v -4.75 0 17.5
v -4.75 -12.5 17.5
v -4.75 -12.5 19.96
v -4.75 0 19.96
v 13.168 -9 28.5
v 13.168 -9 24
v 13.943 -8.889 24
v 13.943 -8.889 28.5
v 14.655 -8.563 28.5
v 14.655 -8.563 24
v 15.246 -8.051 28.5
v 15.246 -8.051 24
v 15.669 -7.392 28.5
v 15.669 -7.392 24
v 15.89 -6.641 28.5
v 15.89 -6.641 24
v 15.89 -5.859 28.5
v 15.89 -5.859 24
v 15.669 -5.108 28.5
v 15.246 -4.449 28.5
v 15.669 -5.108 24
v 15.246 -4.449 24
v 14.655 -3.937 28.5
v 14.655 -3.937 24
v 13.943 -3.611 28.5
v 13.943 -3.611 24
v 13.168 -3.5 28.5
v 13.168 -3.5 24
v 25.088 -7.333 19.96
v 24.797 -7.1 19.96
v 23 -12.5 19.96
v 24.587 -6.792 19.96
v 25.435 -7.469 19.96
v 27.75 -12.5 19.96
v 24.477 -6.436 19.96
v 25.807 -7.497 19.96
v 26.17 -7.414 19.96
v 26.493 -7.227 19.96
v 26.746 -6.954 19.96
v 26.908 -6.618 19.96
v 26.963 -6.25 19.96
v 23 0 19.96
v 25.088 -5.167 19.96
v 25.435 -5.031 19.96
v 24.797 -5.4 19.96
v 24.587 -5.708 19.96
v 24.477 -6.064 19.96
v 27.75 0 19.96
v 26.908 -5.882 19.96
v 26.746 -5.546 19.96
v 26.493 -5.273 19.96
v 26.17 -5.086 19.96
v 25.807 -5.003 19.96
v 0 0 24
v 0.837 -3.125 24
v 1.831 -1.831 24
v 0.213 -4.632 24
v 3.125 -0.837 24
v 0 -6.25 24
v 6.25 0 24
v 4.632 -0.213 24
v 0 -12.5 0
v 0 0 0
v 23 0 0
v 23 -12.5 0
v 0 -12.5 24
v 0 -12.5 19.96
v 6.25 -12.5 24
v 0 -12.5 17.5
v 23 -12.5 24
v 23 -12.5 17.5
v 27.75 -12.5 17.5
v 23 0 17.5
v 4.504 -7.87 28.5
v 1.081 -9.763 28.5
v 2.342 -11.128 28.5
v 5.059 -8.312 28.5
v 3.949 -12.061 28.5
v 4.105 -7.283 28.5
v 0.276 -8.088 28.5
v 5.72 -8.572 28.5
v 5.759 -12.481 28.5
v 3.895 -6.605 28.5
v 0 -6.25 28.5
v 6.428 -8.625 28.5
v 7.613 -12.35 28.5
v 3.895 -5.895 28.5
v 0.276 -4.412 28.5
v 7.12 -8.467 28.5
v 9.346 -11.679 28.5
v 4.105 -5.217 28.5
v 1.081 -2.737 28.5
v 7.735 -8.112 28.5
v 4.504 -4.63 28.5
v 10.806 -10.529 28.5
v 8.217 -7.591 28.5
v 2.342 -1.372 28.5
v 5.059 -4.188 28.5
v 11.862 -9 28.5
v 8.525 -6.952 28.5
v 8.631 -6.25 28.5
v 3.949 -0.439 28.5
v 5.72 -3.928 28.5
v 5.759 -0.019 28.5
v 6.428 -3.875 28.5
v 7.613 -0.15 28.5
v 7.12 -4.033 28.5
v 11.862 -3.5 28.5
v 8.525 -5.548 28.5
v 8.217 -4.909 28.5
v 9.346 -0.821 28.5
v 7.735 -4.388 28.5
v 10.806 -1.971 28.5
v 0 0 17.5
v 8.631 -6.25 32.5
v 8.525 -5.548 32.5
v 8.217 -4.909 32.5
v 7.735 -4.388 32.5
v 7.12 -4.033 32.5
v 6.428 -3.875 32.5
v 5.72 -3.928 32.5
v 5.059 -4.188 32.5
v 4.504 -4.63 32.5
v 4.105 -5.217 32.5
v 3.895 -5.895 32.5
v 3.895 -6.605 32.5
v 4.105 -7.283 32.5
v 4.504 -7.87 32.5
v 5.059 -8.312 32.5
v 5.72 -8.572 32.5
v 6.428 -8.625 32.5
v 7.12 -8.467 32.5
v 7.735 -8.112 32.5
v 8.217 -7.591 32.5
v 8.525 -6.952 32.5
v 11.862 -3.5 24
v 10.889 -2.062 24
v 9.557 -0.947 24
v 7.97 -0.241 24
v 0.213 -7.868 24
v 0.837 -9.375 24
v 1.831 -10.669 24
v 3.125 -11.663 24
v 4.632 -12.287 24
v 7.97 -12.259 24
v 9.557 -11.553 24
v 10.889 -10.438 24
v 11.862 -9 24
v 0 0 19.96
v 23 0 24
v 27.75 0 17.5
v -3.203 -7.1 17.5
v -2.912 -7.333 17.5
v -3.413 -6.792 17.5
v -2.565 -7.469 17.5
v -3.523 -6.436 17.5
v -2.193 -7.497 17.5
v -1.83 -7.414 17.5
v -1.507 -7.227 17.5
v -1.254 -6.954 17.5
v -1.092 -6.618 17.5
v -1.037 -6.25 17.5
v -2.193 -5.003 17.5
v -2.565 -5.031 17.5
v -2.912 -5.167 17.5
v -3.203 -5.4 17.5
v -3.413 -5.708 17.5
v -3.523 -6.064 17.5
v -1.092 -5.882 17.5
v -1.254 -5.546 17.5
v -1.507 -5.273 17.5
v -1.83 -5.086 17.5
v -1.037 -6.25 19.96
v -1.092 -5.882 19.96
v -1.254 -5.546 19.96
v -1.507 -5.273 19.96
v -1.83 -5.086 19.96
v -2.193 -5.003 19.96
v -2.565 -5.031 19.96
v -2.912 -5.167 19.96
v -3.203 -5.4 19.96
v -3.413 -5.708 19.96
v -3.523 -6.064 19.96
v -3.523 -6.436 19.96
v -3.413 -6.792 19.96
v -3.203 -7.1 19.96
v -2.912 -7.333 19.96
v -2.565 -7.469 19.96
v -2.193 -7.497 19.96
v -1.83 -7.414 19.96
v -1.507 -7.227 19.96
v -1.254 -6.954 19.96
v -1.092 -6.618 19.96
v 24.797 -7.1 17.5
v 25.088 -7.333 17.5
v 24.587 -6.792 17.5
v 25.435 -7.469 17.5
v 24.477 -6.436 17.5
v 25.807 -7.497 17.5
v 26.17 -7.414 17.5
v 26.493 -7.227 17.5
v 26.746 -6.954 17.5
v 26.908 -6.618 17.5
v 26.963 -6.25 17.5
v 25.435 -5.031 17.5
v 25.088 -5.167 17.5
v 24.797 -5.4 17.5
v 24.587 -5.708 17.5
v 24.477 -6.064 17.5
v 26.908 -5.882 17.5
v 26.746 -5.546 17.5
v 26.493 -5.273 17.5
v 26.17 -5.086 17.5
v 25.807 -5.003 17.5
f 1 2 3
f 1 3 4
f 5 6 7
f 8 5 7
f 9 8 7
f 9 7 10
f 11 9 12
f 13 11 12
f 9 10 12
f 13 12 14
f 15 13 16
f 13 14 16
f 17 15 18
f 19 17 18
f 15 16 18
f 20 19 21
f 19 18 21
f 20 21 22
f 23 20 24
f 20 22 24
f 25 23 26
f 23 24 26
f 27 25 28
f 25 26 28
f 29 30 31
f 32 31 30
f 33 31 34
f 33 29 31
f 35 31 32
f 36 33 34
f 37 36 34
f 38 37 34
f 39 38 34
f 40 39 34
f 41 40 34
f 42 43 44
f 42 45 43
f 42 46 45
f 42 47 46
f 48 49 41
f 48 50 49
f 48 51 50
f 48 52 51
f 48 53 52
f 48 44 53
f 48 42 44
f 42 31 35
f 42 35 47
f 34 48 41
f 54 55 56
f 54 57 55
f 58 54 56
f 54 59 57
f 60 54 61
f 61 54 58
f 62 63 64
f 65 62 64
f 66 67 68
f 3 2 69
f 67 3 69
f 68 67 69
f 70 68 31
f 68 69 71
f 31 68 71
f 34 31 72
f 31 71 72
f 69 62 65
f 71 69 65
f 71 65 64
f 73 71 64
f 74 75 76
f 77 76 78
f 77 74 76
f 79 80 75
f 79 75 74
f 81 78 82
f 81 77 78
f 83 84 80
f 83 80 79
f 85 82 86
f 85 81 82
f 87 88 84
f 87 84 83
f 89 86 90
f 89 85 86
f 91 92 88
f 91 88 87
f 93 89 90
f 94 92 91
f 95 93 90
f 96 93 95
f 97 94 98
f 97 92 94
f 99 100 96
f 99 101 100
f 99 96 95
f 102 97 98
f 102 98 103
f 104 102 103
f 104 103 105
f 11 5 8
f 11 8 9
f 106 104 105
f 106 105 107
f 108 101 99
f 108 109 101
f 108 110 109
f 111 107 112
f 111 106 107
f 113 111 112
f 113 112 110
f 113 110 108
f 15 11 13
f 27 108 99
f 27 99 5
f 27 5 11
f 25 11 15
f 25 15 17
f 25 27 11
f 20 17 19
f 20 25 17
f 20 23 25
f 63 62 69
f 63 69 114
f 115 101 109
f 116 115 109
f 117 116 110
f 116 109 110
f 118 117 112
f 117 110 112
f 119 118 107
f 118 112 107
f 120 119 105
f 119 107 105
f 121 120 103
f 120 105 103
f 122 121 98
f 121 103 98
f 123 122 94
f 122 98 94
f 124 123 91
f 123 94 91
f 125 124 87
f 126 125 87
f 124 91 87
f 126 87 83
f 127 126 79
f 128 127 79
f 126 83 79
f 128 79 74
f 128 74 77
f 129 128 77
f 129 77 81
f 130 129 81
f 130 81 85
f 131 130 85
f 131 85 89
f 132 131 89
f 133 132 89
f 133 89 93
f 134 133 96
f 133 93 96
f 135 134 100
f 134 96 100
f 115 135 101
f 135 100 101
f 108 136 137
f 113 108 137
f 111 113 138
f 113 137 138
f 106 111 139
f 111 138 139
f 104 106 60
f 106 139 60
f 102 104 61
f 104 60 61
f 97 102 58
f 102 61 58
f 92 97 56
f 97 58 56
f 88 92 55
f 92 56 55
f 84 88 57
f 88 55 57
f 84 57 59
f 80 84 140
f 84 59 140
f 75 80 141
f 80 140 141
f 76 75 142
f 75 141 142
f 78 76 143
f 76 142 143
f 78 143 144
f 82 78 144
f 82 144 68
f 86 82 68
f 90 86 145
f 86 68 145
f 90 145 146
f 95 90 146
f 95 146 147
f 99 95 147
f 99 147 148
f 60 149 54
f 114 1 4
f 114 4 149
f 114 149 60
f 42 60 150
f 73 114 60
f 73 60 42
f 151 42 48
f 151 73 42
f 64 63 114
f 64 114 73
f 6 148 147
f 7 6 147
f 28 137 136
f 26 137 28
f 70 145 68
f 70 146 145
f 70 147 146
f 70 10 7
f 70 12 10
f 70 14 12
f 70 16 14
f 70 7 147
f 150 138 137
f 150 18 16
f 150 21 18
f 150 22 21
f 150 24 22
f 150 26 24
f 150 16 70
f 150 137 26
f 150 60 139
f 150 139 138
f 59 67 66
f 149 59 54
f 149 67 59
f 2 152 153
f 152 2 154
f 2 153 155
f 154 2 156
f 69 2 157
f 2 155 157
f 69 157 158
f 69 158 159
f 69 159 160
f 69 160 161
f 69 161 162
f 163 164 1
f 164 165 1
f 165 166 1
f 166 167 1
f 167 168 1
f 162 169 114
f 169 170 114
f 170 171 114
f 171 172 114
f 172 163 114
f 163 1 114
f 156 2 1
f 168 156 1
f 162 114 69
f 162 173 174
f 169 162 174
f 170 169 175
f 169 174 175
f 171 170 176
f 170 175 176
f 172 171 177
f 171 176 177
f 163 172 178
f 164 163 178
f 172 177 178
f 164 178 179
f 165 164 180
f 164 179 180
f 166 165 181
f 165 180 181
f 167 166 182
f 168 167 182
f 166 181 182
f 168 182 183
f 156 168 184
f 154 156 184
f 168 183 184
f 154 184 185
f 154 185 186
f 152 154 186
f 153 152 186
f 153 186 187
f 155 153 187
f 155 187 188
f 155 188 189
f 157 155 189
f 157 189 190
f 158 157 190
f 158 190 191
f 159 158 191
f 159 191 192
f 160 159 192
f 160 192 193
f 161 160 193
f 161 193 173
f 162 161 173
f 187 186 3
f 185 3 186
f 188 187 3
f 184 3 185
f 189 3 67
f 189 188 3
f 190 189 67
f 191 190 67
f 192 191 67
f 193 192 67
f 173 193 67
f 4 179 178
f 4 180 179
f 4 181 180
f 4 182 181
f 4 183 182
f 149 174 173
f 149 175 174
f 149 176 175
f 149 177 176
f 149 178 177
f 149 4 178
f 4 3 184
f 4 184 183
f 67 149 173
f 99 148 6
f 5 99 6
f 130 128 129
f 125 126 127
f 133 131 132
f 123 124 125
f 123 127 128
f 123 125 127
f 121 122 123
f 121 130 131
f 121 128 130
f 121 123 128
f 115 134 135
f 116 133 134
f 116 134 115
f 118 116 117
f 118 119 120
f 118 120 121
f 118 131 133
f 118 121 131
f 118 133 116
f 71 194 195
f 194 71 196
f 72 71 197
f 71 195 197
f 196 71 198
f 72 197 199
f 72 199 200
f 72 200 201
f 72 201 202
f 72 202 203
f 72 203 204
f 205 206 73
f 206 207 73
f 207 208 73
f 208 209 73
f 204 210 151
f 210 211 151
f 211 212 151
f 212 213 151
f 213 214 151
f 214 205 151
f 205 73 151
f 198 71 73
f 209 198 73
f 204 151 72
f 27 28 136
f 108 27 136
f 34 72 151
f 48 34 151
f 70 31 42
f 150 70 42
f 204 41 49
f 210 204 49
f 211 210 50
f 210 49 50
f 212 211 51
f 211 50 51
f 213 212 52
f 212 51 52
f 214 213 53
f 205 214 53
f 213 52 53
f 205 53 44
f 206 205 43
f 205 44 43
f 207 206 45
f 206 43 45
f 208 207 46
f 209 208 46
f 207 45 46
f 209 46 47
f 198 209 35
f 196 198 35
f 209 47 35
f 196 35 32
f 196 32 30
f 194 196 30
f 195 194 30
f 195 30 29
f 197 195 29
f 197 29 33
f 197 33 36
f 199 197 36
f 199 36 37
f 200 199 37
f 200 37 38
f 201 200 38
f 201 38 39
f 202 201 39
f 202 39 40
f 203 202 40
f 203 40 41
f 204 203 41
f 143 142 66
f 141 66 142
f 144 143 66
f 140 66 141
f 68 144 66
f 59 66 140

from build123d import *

# Parameters (mm, degrees)
SKETCH_1_W          = 23
SKETCH_1_H          = 12.5
EXTRUDE_1_DEPTH     = 24
SKETCH_2_W          = 32.5
SKETCH_2_H          = 12.5
EXTRUDE_2_DEPTH     = 2.46
EXTRUDE_3_DEPTH     = 4.5
SKETCH_4_R          = 2.381232182
EXTRUDE_4_DEPTH     = 4
SKETCH_6_R          = 1.25
CUT_EXTRUDE_1_DEPTH = 37.396622096


with BuildPart() as part:
    # 草图1 → 凸台-拉伸1 (new body)
    with BuildSketch(Plane.XY):
        with Locations((11.5, -6.25)):
            Rectangle(SKETCH_1_W, SKETCH_1_H)
    extrude(amount=EXTRUDE_1_DEPTH)

    # 草图2 → 凸台-拉伸2 (add)
    with BuildSketch(Plane.XY.offset(17.5)):
        with Locations((11.5, -6.25)):
            Rectangle(SKETCH_2_W, SKETCH_2_H)
    extrude(amount=EXTRUDE_2_DEPTH)

    # 草图3 → 凸台-拉伸3 (add)
    with BuildSketch(Plane.XY.offset(24)):
        with BuildLine():
            Line((13.167793033, -3.5), (11.86248608, -3.5))
            ThreePointArc((11.86248608, -3.5), (0, -6.25), (11.86248608, -9))
            Line((11.86248608, -9), (13.167793033, -9))
            ThreePointArc((13.167793033, -9), (15.917793033, -6.25), (13.167793033, -3.5))
        make_face()
    extrude(amount=EXTRUDE_3_DEPTH)

    # 草图4 → 凸台-拉伸4 (add)
    with BuildSketch(Plane.XY.offset(28.5)):
        with Locations((6.25, -6.25)):
            Circle(SKETCH_4_R)
    extrude(amount=EXTRUDE_4_DEPTH)

    # 草图6 → 切除-拉伸1 (cut, through all)
    with BuildSketch(Plane.XY.offset(19.96)):
        with Locations((-2.286532447, -6.25)):
            Circle(SKETCH_6_R)
        with Locations((25.713467553, -6.25)):
            Circle(SKETCH_6_R)
    extrude(amount=-CUT_EXTRUDE_1_DEPTH, mode=Mode.SUBTRACT)


solid = part.part
